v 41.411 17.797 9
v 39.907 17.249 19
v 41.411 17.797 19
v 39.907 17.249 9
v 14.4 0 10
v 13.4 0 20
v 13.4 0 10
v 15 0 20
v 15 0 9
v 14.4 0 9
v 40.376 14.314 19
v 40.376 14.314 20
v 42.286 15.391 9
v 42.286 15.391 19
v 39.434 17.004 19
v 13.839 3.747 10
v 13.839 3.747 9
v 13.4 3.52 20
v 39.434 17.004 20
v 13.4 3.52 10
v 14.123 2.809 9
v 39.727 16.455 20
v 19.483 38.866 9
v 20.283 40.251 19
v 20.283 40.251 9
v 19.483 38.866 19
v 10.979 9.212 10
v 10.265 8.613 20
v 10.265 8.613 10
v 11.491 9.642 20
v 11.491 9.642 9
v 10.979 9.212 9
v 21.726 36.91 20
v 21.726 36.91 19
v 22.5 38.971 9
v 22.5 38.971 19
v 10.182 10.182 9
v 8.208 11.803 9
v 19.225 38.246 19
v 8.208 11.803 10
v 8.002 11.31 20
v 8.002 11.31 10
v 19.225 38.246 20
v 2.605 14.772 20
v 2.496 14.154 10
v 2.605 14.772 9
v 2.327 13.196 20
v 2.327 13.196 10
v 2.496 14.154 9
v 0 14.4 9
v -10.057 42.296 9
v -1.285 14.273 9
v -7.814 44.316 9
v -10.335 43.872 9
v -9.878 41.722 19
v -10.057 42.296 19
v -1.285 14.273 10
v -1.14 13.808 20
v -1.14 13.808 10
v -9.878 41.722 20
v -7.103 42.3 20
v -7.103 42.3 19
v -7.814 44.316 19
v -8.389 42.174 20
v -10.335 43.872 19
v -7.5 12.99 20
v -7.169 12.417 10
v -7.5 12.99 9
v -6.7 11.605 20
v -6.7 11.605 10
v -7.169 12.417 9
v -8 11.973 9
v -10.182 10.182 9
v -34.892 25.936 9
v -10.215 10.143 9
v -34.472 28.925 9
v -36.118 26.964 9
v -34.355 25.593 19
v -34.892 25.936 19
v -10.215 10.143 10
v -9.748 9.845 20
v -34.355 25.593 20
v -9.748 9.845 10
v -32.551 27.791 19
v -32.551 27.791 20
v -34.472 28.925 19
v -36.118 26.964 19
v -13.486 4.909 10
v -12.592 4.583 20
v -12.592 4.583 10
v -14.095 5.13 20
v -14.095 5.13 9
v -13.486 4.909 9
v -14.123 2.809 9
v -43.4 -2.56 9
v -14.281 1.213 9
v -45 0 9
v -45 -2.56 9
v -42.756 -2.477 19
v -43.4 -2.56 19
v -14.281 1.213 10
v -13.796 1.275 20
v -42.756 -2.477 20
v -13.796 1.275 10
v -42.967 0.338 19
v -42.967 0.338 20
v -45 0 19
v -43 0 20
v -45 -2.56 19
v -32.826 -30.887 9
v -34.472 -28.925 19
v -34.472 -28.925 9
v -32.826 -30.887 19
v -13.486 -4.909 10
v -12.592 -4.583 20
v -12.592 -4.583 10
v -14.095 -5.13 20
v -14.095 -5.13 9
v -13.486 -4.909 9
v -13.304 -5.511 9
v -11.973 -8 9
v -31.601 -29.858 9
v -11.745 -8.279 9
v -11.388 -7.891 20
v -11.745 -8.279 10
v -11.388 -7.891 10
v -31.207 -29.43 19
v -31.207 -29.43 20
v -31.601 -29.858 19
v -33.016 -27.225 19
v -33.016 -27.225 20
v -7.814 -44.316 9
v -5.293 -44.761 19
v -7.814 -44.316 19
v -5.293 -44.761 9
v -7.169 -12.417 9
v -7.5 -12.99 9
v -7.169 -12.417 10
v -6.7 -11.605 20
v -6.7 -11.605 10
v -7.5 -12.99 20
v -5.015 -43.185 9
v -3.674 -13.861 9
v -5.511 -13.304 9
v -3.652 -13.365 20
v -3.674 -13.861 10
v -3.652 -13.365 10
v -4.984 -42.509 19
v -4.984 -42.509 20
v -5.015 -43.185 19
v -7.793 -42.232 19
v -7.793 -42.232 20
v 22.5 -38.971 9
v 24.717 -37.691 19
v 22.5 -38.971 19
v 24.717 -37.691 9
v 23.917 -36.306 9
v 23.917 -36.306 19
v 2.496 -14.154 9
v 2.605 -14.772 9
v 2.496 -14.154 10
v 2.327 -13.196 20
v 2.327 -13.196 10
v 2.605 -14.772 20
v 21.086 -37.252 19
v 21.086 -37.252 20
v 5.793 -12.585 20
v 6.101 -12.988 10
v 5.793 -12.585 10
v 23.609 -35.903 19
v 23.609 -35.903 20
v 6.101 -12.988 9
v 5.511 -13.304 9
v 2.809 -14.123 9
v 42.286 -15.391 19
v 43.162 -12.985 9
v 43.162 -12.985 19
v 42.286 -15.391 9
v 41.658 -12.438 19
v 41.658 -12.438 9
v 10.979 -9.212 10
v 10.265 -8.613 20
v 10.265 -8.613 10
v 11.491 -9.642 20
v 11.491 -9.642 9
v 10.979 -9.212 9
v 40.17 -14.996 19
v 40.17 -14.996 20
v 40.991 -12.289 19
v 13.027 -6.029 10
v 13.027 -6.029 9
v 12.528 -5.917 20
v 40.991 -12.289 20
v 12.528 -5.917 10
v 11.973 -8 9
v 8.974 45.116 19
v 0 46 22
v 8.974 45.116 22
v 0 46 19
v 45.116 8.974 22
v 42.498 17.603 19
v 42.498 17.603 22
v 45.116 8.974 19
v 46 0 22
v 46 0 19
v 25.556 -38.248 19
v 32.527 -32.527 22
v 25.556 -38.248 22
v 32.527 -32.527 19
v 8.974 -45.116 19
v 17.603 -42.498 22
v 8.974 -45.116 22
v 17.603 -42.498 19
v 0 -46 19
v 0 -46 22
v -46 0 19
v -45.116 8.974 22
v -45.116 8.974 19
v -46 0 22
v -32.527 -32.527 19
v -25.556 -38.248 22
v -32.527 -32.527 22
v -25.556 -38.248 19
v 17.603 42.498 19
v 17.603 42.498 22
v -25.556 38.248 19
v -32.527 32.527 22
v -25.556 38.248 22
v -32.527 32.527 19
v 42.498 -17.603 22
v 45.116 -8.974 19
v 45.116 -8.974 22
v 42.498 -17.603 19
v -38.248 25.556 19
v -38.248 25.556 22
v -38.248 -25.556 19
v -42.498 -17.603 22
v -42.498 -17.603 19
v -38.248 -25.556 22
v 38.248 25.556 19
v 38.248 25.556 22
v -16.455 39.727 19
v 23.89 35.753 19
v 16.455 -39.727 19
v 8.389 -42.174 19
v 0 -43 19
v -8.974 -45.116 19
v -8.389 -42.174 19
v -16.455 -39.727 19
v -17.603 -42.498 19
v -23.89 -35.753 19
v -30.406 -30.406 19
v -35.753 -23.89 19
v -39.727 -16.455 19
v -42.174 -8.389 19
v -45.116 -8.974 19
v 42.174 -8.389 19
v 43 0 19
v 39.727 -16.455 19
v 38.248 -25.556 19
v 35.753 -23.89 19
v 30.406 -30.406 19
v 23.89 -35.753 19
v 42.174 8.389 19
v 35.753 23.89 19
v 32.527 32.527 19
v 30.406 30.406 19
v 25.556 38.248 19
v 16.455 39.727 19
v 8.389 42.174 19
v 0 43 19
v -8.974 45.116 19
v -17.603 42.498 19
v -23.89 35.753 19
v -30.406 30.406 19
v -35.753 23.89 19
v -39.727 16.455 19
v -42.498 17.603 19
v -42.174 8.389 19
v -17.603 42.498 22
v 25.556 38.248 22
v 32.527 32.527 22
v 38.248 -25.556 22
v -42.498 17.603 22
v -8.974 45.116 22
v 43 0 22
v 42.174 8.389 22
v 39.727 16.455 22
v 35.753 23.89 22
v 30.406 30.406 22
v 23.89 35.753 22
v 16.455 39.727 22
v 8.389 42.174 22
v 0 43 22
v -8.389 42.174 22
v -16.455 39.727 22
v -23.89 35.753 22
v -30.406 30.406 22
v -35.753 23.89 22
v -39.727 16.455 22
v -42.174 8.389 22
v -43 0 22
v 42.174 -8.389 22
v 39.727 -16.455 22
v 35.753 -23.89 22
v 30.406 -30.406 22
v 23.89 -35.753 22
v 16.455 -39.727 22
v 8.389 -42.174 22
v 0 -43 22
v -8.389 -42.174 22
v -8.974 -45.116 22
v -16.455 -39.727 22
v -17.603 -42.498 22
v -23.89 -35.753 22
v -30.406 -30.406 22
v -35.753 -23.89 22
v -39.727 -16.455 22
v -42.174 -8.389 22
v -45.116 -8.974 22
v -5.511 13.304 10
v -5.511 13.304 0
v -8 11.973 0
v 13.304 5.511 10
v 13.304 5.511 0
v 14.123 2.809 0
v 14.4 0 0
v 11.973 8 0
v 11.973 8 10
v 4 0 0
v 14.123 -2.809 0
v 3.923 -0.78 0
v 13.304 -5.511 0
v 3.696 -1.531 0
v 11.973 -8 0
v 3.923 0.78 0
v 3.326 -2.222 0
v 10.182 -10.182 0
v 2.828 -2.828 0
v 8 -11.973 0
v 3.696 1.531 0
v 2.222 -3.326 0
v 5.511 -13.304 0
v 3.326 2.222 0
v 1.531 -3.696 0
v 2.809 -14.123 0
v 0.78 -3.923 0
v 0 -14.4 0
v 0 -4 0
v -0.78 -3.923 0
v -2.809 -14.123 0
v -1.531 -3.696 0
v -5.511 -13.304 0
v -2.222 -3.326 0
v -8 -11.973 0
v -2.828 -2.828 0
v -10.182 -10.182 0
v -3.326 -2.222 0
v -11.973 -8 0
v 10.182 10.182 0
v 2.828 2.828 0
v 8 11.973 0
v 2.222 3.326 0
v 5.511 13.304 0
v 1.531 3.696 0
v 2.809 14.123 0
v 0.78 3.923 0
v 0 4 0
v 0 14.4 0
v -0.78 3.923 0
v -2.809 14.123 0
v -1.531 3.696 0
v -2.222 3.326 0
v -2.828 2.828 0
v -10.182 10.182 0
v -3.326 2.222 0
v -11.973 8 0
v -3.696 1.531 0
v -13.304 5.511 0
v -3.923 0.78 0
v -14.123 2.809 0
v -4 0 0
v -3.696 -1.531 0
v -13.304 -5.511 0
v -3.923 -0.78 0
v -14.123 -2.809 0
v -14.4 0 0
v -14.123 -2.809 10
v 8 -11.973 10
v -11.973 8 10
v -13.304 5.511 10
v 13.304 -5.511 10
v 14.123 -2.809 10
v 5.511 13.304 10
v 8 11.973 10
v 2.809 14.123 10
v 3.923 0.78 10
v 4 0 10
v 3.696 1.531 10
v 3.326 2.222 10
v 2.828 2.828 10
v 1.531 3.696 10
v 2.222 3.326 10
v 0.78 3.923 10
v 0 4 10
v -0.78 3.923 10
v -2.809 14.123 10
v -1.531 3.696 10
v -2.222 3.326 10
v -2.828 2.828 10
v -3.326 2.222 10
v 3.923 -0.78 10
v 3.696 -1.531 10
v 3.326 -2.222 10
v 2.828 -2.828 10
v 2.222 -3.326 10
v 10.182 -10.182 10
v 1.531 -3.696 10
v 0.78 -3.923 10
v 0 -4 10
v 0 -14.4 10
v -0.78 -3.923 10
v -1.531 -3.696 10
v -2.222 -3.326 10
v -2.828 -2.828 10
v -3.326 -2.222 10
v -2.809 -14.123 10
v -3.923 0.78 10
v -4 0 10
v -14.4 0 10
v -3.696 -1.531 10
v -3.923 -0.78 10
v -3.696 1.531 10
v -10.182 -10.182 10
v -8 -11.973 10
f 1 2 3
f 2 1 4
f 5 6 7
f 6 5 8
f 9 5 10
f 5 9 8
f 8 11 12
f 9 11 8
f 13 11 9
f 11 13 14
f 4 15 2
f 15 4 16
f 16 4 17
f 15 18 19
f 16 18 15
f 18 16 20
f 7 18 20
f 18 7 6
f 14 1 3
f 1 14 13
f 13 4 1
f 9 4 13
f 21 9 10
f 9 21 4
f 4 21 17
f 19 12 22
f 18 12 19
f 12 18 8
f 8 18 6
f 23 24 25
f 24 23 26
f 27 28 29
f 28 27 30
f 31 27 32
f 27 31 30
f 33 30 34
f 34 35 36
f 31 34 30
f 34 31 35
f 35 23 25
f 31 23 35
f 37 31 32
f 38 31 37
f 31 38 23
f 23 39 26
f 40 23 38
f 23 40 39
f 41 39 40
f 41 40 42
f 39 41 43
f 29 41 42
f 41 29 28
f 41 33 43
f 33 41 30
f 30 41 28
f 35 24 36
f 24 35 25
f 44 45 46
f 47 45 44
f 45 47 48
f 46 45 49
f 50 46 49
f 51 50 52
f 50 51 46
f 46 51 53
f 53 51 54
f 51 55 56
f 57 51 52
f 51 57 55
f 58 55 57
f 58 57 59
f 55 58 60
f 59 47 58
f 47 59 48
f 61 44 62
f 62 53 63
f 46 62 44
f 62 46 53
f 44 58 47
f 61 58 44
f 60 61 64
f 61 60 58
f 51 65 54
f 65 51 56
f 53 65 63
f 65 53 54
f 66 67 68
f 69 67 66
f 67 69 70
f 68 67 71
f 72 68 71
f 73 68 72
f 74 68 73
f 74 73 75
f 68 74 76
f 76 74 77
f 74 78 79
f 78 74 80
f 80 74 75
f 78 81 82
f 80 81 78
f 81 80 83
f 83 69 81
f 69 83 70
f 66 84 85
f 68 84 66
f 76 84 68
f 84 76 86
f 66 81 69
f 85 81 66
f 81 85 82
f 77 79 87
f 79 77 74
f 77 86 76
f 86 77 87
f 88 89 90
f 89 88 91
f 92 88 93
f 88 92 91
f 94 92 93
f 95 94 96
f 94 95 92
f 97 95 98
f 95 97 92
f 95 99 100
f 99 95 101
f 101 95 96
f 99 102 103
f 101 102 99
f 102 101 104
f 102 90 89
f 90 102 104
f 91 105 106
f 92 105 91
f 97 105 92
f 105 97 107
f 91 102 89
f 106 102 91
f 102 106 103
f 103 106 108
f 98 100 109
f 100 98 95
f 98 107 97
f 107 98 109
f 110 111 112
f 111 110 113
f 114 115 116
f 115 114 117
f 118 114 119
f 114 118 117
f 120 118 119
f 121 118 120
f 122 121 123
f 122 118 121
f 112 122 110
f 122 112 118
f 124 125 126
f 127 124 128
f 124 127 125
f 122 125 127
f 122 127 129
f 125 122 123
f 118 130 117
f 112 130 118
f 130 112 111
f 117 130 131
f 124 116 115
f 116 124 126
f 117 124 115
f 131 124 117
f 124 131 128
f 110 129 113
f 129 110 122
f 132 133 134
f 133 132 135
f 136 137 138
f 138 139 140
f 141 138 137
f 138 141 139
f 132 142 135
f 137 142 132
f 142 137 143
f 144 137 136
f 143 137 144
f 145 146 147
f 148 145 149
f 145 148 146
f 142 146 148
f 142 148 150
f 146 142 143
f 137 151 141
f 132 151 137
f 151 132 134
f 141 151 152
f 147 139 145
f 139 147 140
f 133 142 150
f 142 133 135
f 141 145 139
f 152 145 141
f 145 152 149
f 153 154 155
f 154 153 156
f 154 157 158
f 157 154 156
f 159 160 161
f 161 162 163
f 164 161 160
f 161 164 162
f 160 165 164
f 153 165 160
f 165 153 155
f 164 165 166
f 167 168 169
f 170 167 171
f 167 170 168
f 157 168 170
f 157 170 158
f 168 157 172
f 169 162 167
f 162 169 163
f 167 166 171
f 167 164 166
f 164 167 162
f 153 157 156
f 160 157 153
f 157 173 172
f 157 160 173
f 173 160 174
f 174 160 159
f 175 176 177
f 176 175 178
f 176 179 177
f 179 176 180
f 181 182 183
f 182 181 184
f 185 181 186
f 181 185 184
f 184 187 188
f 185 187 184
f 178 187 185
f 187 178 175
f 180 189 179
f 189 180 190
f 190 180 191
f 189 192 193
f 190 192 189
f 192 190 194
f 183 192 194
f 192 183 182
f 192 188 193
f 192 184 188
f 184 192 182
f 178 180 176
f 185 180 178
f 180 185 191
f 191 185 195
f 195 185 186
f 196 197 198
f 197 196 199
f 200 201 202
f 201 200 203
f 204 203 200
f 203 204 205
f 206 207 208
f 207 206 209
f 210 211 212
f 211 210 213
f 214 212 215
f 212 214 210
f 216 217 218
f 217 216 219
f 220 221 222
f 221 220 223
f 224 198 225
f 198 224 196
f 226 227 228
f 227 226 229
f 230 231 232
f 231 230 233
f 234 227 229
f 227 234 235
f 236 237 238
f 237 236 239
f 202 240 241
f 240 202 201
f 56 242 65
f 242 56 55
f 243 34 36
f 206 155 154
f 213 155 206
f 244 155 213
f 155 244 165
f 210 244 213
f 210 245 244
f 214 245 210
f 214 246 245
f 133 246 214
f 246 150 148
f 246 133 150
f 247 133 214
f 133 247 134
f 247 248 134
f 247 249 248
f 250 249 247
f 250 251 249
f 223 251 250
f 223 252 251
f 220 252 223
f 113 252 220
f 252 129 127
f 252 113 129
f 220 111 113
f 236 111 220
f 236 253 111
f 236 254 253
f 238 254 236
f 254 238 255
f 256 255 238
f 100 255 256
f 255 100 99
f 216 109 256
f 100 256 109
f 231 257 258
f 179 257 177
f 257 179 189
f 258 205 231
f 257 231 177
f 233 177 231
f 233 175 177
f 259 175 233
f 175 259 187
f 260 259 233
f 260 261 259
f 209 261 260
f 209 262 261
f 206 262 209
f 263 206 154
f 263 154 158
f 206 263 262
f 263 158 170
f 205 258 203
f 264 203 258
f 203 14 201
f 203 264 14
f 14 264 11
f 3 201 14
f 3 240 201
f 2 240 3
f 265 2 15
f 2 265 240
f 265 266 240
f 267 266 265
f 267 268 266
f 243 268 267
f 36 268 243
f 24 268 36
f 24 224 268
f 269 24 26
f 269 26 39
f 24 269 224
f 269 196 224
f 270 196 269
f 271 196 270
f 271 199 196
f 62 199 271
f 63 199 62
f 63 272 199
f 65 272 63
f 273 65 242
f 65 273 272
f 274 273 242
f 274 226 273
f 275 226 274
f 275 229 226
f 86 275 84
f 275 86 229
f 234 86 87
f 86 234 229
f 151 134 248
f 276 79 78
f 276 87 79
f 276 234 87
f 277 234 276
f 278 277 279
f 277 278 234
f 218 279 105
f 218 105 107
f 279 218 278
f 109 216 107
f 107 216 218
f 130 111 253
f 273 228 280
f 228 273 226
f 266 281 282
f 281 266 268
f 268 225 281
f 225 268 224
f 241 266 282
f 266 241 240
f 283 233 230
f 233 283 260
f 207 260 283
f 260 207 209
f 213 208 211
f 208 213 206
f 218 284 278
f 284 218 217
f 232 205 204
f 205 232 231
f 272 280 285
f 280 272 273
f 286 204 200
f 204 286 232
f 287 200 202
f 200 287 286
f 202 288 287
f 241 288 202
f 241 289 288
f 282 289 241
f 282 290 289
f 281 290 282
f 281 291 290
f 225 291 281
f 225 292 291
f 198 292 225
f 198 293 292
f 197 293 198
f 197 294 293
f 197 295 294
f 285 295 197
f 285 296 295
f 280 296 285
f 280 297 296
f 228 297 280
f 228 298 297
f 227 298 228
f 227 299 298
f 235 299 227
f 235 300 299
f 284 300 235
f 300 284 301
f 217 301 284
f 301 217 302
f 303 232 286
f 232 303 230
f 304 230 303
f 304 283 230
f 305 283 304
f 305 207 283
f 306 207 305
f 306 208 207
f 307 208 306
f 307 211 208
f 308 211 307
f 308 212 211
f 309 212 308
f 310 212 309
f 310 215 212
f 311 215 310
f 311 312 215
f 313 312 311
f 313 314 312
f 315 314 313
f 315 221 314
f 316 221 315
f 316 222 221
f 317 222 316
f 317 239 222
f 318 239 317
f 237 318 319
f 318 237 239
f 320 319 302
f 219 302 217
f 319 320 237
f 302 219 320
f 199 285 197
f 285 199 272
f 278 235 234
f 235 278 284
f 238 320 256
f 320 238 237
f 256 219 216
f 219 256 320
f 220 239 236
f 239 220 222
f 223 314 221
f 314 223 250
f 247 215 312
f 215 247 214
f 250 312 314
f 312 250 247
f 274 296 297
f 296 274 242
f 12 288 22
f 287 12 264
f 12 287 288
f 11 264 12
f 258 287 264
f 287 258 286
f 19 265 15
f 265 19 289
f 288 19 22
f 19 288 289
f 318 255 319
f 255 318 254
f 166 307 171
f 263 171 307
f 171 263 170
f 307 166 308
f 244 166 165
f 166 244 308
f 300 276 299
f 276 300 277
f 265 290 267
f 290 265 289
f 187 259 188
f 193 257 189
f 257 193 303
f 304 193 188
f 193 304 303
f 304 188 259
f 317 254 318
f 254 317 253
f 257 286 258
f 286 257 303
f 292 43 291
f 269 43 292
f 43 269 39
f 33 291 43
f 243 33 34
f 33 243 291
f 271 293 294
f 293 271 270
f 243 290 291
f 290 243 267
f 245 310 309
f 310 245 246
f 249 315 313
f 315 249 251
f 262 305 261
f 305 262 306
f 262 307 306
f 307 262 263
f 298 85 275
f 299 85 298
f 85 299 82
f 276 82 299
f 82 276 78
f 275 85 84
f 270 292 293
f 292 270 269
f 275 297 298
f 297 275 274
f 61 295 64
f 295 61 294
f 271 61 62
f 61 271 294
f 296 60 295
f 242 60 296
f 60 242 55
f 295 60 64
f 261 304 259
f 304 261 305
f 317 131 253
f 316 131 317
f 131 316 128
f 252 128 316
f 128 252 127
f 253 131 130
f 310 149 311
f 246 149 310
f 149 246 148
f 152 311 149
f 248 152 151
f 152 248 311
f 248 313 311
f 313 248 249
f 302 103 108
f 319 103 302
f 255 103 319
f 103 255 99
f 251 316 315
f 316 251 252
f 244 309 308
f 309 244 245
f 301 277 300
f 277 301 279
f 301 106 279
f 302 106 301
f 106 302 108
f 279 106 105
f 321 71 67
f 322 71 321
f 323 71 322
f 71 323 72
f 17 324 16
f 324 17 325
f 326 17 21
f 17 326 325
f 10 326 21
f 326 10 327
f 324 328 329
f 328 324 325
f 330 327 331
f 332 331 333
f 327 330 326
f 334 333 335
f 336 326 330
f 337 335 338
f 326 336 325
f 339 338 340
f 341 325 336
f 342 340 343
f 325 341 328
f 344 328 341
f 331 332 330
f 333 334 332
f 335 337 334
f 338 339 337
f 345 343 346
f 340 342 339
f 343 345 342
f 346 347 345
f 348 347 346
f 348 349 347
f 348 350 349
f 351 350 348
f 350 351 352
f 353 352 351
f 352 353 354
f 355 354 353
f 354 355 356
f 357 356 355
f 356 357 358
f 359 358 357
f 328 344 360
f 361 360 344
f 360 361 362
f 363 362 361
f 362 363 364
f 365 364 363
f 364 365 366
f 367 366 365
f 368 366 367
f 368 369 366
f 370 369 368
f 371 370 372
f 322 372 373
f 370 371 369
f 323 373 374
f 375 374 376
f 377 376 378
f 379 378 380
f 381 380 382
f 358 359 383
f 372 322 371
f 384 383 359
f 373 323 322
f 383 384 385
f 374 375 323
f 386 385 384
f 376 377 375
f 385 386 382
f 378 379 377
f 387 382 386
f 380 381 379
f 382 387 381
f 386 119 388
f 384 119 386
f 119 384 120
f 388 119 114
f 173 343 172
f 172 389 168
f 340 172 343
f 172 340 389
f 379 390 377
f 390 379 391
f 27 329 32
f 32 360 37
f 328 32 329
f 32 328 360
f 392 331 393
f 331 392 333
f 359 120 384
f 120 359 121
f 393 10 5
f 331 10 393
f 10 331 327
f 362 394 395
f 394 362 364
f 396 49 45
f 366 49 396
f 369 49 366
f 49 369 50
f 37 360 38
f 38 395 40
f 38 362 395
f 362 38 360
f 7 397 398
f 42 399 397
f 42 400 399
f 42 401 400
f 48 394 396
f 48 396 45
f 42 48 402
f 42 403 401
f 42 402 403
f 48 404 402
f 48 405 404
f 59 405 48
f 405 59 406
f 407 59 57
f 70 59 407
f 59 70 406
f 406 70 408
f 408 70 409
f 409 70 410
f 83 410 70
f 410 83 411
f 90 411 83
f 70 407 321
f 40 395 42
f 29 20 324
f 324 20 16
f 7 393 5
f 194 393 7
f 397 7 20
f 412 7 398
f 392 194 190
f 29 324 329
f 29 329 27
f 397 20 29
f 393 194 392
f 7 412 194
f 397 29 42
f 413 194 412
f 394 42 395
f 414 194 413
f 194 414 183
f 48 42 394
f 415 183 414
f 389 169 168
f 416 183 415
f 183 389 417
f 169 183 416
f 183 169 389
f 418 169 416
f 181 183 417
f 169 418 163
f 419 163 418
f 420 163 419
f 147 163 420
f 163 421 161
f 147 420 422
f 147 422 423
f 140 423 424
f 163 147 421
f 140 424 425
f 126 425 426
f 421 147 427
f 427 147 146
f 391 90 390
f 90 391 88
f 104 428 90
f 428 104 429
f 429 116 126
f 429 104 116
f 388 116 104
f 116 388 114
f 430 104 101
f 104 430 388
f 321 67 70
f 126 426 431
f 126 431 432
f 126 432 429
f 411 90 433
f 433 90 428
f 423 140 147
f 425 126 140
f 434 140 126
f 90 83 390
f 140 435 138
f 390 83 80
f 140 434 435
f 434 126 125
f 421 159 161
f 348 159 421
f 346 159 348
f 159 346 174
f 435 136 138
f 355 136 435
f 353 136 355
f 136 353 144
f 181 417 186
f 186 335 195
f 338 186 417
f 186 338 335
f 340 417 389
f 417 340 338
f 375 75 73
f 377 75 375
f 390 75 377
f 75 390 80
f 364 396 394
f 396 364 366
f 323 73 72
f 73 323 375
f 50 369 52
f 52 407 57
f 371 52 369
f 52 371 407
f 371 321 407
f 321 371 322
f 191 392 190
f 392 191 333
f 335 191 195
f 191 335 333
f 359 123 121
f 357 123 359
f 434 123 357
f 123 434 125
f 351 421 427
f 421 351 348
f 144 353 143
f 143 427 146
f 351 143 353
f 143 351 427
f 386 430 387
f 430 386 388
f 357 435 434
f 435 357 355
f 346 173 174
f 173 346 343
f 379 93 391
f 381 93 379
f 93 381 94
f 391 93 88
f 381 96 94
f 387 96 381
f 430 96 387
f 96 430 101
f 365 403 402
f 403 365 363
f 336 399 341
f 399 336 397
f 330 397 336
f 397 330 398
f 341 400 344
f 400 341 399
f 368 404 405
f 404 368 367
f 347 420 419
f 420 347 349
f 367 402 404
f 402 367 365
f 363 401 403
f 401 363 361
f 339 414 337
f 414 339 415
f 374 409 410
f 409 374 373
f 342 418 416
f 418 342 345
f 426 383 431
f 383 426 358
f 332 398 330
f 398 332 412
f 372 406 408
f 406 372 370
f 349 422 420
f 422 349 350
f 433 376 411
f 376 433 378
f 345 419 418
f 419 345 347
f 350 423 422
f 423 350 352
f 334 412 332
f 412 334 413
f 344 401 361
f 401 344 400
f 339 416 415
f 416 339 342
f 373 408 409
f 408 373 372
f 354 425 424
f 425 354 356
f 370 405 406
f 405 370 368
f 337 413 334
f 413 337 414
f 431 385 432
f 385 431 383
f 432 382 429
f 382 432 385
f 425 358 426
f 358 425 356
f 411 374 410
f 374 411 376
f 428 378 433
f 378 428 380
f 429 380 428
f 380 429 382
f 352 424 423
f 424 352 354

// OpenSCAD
$fn = 32;

// ----------------------------------------------------------------------
// Impeller: 90 mm, 9 blades, 22 mm tall
// ----------------------------------------------------------------------

// --- parameters (mm) ---
center_d = 28.8;          // hub diameter
center_h = 10;            // hub height
wheel_d = 90;             // outer diameter over the blades
blade_count = 9;          // number of blades
blade_t = 1.6;            // blade thickness
blade_h = 10;             // blade height
blade_in_r = 13.4;        // blade root radius
blade_out_r = 43.4;       // blade tip radius
sweep = 20;               // blade sweep, degrees
bore_d = 8;               // shaft bore
shroud_h = 2;             // shroud ring thickness
shroud_d = 92;            // shroud outside diameter

module hub() {
  cylinder(h = center_h, d = center_d);
}

module blade() {
  /* blade swept between two boxes: hull of the root and the tip section */
  hull() {
    translate([blade_in_r, 0, center_h - 1])
      cube([blade_t, blade_t * 2.2, blade_h + 1], center = false);
    rotate([0, 0, sweep])
      translate([blade_out_r, 0, center_h - 1])
        cube([blade_t, blade_t * 1.6, blade_h + 1], center = false);
  }
}

module blades() {
  for (i = [0 : blade_count - 1])
    rotate([0, 0, i * 360 / blade_count]) blade();
}

module shroud() {
  translate([0, 0, center_h + blade_h - 1])
    difference() {
      cylinder(h = shroud_h + 1, d = shroud_d);
      translate([0, 0, -1]) cylinder(h = shroud_h + 3, d = shroud_d - 2 * 3);
    }
}

difference() {
  union() {
    hub();
    blades();
    shroud();
  }
  translate([0, 0, -1]) cylinder(h = center_h + blade_h + shroud_h + 3, d = bore_d);
}
